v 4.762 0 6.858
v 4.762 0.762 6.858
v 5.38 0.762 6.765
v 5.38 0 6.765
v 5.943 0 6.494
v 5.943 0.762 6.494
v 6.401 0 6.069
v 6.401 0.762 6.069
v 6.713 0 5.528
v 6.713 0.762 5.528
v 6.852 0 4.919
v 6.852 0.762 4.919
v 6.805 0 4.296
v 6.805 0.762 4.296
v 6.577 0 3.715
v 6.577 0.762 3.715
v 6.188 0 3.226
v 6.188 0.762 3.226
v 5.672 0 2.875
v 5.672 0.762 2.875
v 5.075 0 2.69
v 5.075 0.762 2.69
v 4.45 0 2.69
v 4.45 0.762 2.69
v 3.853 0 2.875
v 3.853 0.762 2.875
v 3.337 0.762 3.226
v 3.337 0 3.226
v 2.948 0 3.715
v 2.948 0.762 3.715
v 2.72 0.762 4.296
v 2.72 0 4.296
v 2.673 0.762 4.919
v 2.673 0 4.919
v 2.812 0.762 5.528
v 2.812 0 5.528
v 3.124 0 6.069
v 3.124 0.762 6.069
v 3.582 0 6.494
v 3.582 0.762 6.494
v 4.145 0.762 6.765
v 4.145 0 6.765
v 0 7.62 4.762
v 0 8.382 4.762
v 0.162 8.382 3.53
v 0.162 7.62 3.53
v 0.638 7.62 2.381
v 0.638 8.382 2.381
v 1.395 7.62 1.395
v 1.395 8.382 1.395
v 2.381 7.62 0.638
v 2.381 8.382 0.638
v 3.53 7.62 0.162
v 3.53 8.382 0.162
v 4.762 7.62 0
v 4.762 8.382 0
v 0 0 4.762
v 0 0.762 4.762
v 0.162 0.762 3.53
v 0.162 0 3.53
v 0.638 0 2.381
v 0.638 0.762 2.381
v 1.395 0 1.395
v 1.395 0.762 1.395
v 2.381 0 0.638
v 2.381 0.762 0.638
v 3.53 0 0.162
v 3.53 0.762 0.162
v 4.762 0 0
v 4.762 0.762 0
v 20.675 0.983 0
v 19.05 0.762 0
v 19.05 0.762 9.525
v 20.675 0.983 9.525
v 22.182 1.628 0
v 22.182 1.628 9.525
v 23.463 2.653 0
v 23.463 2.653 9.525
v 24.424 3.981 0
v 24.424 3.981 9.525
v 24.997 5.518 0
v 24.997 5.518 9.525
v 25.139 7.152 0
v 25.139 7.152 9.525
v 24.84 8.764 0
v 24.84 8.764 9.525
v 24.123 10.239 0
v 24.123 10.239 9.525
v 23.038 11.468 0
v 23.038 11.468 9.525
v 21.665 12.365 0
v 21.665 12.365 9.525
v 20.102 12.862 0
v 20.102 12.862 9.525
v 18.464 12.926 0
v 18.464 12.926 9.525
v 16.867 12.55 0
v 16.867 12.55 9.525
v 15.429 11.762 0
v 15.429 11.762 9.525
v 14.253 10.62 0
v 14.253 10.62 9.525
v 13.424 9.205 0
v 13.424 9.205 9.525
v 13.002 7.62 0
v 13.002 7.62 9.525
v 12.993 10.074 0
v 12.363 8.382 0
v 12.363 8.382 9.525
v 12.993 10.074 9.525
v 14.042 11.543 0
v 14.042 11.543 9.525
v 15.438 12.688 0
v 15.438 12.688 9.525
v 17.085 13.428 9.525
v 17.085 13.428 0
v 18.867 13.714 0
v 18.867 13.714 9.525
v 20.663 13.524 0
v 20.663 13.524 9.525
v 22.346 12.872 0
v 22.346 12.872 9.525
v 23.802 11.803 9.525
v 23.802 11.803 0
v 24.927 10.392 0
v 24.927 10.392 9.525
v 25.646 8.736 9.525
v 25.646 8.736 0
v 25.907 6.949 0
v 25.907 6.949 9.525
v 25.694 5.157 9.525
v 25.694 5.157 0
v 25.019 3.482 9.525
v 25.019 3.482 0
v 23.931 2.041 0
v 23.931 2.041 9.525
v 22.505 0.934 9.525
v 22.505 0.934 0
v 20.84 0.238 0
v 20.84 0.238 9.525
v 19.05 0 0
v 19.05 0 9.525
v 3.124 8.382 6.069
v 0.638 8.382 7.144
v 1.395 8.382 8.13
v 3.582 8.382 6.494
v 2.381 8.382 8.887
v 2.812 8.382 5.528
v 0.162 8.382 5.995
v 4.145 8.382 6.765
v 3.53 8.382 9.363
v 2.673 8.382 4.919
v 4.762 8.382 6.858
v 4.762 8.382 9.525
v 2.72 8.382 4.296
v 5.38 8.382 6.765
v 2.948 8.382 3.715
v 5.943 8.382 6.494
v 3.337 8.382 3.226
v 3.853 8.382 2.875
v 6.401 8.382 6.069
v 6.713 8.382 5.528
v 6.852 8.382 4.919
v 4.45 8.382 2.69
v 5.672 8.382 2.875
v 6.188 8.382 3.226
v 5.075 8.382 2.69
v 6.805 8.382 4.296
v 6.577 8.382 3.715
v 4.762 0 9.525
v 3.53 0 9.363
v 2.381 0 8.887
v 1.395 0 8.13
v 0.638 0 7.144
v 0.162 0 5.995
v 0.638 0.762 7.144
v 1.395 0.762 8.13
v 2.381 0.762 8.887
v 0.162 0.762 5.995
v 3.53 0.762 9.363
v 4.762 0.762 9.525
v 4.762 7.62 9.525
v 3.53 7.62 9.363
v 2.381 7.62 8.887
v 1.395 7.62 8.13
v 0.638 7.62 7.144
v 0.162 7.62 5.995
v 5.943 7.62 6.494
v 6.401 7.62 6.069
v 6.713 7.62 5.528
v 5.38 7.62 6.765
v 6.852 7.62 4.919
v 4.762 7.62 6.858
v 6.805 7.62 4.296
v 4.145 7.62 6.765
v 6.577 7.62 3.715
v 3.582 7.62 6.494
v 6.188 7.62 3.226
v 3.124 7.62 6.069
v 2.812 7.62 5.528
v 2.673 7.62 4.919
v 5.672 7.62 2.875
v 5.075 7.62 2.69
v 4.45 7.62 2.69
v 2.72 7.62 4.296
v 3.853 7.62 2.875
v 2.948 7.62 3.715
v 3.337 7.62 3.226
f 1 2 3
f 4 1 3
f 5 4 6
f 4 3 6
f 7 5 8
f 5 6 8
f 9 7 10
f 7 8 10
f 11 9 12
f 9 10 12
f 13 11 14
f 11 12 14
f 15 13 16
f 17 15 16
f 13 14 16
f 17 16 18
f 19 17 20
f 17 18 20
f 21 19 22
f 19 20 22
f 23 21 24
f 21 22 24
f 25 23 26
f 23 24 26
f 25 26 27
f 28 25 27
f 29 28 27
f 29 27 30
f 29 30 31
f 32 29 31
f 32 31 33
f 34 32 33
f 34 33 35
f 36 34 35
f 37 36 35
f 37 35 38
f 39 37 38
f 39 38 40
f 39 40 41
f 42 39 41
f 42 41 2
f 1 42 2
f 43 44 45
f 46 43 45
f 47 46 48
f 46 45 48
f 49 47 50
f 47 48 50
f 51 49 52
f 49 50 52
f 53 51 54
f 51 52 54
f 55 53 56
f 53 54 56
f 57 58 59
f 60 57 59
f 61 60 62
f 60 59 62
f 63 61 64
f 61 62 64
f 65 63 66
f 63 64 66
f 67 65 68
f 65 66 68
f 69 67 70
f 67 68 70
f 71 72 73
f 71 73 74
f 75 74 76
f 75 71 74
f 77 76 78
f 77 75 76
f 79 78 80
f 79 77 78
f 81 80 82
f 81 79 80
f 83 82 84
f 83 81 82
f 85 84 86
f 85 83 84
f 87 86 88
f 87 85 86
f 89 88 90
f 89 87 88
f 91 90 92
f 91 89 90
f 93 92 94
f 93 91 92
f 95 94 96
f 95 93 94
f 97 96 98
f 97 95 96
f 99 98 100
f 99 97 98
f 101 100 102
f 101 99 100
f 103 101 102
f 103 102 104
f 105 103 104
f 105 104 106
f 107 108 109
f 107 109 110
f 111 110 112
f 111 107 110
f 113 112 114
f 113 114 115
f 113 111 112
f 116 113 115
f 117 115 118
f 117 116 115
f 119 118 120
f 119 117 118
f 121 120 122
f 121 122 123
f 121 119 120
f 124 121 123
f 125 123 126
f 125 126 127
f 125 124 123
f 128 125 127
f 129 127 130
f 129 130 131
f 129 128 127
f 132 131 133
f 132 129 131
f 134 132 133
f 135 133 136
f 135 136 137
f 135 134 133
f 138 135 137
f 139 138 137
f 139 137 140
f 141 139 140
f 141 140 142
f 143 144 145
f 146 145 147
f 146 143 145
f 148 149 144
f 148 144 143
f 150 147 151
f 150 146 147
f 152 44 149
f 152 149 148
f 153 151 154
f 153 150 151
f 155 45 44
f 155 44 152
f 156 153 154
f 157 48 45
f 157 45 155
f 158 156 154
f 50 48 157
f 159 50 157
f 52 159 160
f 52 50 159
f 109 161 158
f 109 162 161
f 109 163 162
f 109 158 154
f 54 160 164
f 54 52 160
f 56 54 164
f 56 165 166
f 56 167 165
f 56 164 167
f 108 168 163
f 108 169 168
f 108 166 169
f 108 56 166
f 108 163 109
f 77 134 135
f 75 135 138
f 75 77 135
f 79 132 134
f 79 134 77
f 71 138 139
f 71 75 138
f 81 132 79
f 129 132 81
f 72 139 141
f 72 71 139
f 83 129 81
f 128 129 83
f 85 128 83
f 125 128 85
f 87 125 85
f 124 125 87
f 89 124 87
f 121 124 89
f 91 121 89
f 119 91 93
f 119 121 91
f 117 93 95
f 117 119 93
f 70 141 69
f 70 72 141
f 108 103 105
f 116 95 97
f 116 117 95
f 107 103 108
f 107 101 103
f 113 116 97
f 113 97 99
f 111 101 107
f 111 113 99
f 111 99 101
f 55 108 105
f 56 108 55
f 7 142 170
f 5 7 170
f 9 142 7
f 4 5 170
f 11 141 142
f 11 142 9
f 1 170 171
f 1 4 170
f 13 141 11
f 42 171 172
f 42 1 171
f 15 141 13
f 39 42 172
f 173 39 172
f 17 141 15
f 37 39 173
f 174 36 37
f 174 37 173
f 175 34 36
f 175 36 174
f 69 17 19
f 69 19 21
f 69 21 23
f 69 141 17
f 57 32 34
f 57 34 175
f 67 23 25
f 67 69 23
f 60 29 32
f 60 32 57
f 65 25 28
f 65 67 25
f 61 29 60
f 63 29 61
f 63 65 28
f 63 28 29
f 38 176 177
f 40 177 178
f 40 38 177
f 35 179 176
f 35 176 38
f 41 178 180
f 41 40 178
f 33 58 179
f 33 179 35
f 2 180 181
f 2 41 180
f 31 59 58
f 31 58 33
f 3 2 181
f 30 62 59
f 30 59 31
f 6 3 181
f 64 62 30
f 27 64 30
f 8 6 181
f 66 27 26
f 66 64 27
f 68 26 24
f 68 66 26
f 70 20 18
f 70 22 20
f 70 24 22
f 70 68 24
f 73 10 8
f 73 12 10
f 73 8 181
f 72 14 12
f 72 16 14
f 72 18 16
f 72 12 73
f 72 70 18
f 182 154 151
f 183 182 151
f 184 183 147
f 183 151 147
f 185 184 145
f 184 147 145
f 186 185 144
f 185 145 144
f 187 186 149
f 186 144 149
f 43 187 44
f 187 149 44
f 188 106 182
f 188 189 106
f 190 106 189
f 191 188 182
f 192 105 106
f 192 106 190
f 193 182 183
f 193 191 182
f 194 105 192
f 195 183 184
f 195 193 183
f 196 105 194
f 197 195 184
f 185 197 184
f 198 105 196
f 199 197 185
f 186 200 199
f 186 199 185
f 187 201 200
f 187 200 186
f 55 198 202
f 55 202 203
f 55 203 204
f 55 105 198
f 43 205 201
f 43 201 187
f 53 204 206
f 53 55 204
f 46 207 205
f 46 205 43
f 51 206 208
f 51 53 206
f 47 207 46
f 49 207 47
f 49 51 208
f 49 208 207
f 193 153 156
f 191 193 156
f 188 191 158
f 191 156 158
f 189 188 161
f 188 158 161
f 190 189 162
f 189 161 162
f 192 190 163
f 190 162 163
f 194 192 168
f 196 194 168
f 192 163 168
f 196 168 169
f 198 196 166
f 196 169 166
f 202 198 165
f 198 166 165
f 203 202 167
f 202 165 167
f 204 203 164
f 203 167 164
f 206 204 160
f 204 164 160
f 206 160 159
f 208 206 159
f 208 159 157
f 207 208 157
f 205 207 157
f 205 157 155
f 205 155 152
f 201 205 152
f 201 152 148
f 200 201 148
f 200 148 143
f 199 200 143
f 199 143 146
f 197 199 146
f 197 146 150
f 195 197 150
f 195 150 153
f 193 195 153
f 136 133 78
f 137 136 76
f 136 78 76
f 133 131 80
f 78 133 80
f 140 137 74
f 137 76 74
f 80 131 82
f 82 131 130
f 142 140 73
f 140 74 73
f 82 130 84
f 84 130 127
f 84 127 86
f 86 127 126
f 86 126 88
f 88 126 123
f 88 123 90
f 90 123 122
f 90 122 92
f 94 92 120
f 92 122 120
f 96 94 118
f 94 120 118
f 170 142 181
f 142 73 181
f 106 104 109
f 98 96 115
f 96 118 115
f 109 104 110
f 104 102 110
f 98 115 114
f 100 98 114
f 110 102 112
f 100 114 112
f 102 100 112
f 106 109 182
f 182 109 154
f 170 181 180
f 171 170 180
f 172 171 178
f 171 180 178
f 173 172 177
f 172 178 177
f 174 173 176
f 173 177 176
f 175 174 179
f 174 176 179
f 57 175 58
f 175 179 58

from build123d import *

# Parameters (mm, degrees)
BOSS_EXTRUDE1_DEPTH = 9.525
SKETCH2_R           = 2.0955
CUT_EXTRUDE1_DEPTH  = 29.848015755


with BuildPart() as part:
    # Sketch1 → Boss-Extrude1 (new body)
    with BuildSketch(Plane.XY):
        with BuildLine():
            Line((0, 8.382), (12.363477137, 8.382))
            ThreePointArc((12.363477137, 8.382), (24.411145213, 11.134714393), (19.05, 0))
            Line((19.05, 0), (0, 0))
            Line((0, 0), (0, 0.762))
            Line((0, 0.762), (19.05, 0.762))
            ThreePointArc((19.05, 0.762), (23.622, 10.890124998), (13.001812503, 7.62))
            Line((13.001812503, 7.62), (0, 7.62))
            Line((0, 7.62), (0, 8.382))
        make_face()
    extrude(amount=BOSS_EXTRUDE1_DEPTH)

    # Sketch2 → Cut-Extrude1 (cut, through all)
    with BuildSketch(Plane(origin=(0, 8.382, 0), x_dir=(1, 0, 0), z_dir=(0, 1, 0))):
        with BuildLine():
            Line((0, 0), (0, -4.7625))
            ThreePointArc((0, -4.7625), (1.394903955, -1.394903955), (4.7625, 0))
            Line((4.7625, 0), (0, 0))
        make_face()
        with BuildLine():
            Line((0, -9.525), (4.7625, -9.525))
            ThreePointArc((4.7625, -9.525), (1.394903955, -8.130096045), (0, -4.7625))
            Line((0, -4.7625), (0, -9.525))
        make_face()
        with Locations((4.7625, -4.7625)):
            Circle(SKETCH2_R)
    extrude(amount=-CUT_EXTRUDE1_DEPTH, mode=Mode.SUBTRACT)


solid = part.part
